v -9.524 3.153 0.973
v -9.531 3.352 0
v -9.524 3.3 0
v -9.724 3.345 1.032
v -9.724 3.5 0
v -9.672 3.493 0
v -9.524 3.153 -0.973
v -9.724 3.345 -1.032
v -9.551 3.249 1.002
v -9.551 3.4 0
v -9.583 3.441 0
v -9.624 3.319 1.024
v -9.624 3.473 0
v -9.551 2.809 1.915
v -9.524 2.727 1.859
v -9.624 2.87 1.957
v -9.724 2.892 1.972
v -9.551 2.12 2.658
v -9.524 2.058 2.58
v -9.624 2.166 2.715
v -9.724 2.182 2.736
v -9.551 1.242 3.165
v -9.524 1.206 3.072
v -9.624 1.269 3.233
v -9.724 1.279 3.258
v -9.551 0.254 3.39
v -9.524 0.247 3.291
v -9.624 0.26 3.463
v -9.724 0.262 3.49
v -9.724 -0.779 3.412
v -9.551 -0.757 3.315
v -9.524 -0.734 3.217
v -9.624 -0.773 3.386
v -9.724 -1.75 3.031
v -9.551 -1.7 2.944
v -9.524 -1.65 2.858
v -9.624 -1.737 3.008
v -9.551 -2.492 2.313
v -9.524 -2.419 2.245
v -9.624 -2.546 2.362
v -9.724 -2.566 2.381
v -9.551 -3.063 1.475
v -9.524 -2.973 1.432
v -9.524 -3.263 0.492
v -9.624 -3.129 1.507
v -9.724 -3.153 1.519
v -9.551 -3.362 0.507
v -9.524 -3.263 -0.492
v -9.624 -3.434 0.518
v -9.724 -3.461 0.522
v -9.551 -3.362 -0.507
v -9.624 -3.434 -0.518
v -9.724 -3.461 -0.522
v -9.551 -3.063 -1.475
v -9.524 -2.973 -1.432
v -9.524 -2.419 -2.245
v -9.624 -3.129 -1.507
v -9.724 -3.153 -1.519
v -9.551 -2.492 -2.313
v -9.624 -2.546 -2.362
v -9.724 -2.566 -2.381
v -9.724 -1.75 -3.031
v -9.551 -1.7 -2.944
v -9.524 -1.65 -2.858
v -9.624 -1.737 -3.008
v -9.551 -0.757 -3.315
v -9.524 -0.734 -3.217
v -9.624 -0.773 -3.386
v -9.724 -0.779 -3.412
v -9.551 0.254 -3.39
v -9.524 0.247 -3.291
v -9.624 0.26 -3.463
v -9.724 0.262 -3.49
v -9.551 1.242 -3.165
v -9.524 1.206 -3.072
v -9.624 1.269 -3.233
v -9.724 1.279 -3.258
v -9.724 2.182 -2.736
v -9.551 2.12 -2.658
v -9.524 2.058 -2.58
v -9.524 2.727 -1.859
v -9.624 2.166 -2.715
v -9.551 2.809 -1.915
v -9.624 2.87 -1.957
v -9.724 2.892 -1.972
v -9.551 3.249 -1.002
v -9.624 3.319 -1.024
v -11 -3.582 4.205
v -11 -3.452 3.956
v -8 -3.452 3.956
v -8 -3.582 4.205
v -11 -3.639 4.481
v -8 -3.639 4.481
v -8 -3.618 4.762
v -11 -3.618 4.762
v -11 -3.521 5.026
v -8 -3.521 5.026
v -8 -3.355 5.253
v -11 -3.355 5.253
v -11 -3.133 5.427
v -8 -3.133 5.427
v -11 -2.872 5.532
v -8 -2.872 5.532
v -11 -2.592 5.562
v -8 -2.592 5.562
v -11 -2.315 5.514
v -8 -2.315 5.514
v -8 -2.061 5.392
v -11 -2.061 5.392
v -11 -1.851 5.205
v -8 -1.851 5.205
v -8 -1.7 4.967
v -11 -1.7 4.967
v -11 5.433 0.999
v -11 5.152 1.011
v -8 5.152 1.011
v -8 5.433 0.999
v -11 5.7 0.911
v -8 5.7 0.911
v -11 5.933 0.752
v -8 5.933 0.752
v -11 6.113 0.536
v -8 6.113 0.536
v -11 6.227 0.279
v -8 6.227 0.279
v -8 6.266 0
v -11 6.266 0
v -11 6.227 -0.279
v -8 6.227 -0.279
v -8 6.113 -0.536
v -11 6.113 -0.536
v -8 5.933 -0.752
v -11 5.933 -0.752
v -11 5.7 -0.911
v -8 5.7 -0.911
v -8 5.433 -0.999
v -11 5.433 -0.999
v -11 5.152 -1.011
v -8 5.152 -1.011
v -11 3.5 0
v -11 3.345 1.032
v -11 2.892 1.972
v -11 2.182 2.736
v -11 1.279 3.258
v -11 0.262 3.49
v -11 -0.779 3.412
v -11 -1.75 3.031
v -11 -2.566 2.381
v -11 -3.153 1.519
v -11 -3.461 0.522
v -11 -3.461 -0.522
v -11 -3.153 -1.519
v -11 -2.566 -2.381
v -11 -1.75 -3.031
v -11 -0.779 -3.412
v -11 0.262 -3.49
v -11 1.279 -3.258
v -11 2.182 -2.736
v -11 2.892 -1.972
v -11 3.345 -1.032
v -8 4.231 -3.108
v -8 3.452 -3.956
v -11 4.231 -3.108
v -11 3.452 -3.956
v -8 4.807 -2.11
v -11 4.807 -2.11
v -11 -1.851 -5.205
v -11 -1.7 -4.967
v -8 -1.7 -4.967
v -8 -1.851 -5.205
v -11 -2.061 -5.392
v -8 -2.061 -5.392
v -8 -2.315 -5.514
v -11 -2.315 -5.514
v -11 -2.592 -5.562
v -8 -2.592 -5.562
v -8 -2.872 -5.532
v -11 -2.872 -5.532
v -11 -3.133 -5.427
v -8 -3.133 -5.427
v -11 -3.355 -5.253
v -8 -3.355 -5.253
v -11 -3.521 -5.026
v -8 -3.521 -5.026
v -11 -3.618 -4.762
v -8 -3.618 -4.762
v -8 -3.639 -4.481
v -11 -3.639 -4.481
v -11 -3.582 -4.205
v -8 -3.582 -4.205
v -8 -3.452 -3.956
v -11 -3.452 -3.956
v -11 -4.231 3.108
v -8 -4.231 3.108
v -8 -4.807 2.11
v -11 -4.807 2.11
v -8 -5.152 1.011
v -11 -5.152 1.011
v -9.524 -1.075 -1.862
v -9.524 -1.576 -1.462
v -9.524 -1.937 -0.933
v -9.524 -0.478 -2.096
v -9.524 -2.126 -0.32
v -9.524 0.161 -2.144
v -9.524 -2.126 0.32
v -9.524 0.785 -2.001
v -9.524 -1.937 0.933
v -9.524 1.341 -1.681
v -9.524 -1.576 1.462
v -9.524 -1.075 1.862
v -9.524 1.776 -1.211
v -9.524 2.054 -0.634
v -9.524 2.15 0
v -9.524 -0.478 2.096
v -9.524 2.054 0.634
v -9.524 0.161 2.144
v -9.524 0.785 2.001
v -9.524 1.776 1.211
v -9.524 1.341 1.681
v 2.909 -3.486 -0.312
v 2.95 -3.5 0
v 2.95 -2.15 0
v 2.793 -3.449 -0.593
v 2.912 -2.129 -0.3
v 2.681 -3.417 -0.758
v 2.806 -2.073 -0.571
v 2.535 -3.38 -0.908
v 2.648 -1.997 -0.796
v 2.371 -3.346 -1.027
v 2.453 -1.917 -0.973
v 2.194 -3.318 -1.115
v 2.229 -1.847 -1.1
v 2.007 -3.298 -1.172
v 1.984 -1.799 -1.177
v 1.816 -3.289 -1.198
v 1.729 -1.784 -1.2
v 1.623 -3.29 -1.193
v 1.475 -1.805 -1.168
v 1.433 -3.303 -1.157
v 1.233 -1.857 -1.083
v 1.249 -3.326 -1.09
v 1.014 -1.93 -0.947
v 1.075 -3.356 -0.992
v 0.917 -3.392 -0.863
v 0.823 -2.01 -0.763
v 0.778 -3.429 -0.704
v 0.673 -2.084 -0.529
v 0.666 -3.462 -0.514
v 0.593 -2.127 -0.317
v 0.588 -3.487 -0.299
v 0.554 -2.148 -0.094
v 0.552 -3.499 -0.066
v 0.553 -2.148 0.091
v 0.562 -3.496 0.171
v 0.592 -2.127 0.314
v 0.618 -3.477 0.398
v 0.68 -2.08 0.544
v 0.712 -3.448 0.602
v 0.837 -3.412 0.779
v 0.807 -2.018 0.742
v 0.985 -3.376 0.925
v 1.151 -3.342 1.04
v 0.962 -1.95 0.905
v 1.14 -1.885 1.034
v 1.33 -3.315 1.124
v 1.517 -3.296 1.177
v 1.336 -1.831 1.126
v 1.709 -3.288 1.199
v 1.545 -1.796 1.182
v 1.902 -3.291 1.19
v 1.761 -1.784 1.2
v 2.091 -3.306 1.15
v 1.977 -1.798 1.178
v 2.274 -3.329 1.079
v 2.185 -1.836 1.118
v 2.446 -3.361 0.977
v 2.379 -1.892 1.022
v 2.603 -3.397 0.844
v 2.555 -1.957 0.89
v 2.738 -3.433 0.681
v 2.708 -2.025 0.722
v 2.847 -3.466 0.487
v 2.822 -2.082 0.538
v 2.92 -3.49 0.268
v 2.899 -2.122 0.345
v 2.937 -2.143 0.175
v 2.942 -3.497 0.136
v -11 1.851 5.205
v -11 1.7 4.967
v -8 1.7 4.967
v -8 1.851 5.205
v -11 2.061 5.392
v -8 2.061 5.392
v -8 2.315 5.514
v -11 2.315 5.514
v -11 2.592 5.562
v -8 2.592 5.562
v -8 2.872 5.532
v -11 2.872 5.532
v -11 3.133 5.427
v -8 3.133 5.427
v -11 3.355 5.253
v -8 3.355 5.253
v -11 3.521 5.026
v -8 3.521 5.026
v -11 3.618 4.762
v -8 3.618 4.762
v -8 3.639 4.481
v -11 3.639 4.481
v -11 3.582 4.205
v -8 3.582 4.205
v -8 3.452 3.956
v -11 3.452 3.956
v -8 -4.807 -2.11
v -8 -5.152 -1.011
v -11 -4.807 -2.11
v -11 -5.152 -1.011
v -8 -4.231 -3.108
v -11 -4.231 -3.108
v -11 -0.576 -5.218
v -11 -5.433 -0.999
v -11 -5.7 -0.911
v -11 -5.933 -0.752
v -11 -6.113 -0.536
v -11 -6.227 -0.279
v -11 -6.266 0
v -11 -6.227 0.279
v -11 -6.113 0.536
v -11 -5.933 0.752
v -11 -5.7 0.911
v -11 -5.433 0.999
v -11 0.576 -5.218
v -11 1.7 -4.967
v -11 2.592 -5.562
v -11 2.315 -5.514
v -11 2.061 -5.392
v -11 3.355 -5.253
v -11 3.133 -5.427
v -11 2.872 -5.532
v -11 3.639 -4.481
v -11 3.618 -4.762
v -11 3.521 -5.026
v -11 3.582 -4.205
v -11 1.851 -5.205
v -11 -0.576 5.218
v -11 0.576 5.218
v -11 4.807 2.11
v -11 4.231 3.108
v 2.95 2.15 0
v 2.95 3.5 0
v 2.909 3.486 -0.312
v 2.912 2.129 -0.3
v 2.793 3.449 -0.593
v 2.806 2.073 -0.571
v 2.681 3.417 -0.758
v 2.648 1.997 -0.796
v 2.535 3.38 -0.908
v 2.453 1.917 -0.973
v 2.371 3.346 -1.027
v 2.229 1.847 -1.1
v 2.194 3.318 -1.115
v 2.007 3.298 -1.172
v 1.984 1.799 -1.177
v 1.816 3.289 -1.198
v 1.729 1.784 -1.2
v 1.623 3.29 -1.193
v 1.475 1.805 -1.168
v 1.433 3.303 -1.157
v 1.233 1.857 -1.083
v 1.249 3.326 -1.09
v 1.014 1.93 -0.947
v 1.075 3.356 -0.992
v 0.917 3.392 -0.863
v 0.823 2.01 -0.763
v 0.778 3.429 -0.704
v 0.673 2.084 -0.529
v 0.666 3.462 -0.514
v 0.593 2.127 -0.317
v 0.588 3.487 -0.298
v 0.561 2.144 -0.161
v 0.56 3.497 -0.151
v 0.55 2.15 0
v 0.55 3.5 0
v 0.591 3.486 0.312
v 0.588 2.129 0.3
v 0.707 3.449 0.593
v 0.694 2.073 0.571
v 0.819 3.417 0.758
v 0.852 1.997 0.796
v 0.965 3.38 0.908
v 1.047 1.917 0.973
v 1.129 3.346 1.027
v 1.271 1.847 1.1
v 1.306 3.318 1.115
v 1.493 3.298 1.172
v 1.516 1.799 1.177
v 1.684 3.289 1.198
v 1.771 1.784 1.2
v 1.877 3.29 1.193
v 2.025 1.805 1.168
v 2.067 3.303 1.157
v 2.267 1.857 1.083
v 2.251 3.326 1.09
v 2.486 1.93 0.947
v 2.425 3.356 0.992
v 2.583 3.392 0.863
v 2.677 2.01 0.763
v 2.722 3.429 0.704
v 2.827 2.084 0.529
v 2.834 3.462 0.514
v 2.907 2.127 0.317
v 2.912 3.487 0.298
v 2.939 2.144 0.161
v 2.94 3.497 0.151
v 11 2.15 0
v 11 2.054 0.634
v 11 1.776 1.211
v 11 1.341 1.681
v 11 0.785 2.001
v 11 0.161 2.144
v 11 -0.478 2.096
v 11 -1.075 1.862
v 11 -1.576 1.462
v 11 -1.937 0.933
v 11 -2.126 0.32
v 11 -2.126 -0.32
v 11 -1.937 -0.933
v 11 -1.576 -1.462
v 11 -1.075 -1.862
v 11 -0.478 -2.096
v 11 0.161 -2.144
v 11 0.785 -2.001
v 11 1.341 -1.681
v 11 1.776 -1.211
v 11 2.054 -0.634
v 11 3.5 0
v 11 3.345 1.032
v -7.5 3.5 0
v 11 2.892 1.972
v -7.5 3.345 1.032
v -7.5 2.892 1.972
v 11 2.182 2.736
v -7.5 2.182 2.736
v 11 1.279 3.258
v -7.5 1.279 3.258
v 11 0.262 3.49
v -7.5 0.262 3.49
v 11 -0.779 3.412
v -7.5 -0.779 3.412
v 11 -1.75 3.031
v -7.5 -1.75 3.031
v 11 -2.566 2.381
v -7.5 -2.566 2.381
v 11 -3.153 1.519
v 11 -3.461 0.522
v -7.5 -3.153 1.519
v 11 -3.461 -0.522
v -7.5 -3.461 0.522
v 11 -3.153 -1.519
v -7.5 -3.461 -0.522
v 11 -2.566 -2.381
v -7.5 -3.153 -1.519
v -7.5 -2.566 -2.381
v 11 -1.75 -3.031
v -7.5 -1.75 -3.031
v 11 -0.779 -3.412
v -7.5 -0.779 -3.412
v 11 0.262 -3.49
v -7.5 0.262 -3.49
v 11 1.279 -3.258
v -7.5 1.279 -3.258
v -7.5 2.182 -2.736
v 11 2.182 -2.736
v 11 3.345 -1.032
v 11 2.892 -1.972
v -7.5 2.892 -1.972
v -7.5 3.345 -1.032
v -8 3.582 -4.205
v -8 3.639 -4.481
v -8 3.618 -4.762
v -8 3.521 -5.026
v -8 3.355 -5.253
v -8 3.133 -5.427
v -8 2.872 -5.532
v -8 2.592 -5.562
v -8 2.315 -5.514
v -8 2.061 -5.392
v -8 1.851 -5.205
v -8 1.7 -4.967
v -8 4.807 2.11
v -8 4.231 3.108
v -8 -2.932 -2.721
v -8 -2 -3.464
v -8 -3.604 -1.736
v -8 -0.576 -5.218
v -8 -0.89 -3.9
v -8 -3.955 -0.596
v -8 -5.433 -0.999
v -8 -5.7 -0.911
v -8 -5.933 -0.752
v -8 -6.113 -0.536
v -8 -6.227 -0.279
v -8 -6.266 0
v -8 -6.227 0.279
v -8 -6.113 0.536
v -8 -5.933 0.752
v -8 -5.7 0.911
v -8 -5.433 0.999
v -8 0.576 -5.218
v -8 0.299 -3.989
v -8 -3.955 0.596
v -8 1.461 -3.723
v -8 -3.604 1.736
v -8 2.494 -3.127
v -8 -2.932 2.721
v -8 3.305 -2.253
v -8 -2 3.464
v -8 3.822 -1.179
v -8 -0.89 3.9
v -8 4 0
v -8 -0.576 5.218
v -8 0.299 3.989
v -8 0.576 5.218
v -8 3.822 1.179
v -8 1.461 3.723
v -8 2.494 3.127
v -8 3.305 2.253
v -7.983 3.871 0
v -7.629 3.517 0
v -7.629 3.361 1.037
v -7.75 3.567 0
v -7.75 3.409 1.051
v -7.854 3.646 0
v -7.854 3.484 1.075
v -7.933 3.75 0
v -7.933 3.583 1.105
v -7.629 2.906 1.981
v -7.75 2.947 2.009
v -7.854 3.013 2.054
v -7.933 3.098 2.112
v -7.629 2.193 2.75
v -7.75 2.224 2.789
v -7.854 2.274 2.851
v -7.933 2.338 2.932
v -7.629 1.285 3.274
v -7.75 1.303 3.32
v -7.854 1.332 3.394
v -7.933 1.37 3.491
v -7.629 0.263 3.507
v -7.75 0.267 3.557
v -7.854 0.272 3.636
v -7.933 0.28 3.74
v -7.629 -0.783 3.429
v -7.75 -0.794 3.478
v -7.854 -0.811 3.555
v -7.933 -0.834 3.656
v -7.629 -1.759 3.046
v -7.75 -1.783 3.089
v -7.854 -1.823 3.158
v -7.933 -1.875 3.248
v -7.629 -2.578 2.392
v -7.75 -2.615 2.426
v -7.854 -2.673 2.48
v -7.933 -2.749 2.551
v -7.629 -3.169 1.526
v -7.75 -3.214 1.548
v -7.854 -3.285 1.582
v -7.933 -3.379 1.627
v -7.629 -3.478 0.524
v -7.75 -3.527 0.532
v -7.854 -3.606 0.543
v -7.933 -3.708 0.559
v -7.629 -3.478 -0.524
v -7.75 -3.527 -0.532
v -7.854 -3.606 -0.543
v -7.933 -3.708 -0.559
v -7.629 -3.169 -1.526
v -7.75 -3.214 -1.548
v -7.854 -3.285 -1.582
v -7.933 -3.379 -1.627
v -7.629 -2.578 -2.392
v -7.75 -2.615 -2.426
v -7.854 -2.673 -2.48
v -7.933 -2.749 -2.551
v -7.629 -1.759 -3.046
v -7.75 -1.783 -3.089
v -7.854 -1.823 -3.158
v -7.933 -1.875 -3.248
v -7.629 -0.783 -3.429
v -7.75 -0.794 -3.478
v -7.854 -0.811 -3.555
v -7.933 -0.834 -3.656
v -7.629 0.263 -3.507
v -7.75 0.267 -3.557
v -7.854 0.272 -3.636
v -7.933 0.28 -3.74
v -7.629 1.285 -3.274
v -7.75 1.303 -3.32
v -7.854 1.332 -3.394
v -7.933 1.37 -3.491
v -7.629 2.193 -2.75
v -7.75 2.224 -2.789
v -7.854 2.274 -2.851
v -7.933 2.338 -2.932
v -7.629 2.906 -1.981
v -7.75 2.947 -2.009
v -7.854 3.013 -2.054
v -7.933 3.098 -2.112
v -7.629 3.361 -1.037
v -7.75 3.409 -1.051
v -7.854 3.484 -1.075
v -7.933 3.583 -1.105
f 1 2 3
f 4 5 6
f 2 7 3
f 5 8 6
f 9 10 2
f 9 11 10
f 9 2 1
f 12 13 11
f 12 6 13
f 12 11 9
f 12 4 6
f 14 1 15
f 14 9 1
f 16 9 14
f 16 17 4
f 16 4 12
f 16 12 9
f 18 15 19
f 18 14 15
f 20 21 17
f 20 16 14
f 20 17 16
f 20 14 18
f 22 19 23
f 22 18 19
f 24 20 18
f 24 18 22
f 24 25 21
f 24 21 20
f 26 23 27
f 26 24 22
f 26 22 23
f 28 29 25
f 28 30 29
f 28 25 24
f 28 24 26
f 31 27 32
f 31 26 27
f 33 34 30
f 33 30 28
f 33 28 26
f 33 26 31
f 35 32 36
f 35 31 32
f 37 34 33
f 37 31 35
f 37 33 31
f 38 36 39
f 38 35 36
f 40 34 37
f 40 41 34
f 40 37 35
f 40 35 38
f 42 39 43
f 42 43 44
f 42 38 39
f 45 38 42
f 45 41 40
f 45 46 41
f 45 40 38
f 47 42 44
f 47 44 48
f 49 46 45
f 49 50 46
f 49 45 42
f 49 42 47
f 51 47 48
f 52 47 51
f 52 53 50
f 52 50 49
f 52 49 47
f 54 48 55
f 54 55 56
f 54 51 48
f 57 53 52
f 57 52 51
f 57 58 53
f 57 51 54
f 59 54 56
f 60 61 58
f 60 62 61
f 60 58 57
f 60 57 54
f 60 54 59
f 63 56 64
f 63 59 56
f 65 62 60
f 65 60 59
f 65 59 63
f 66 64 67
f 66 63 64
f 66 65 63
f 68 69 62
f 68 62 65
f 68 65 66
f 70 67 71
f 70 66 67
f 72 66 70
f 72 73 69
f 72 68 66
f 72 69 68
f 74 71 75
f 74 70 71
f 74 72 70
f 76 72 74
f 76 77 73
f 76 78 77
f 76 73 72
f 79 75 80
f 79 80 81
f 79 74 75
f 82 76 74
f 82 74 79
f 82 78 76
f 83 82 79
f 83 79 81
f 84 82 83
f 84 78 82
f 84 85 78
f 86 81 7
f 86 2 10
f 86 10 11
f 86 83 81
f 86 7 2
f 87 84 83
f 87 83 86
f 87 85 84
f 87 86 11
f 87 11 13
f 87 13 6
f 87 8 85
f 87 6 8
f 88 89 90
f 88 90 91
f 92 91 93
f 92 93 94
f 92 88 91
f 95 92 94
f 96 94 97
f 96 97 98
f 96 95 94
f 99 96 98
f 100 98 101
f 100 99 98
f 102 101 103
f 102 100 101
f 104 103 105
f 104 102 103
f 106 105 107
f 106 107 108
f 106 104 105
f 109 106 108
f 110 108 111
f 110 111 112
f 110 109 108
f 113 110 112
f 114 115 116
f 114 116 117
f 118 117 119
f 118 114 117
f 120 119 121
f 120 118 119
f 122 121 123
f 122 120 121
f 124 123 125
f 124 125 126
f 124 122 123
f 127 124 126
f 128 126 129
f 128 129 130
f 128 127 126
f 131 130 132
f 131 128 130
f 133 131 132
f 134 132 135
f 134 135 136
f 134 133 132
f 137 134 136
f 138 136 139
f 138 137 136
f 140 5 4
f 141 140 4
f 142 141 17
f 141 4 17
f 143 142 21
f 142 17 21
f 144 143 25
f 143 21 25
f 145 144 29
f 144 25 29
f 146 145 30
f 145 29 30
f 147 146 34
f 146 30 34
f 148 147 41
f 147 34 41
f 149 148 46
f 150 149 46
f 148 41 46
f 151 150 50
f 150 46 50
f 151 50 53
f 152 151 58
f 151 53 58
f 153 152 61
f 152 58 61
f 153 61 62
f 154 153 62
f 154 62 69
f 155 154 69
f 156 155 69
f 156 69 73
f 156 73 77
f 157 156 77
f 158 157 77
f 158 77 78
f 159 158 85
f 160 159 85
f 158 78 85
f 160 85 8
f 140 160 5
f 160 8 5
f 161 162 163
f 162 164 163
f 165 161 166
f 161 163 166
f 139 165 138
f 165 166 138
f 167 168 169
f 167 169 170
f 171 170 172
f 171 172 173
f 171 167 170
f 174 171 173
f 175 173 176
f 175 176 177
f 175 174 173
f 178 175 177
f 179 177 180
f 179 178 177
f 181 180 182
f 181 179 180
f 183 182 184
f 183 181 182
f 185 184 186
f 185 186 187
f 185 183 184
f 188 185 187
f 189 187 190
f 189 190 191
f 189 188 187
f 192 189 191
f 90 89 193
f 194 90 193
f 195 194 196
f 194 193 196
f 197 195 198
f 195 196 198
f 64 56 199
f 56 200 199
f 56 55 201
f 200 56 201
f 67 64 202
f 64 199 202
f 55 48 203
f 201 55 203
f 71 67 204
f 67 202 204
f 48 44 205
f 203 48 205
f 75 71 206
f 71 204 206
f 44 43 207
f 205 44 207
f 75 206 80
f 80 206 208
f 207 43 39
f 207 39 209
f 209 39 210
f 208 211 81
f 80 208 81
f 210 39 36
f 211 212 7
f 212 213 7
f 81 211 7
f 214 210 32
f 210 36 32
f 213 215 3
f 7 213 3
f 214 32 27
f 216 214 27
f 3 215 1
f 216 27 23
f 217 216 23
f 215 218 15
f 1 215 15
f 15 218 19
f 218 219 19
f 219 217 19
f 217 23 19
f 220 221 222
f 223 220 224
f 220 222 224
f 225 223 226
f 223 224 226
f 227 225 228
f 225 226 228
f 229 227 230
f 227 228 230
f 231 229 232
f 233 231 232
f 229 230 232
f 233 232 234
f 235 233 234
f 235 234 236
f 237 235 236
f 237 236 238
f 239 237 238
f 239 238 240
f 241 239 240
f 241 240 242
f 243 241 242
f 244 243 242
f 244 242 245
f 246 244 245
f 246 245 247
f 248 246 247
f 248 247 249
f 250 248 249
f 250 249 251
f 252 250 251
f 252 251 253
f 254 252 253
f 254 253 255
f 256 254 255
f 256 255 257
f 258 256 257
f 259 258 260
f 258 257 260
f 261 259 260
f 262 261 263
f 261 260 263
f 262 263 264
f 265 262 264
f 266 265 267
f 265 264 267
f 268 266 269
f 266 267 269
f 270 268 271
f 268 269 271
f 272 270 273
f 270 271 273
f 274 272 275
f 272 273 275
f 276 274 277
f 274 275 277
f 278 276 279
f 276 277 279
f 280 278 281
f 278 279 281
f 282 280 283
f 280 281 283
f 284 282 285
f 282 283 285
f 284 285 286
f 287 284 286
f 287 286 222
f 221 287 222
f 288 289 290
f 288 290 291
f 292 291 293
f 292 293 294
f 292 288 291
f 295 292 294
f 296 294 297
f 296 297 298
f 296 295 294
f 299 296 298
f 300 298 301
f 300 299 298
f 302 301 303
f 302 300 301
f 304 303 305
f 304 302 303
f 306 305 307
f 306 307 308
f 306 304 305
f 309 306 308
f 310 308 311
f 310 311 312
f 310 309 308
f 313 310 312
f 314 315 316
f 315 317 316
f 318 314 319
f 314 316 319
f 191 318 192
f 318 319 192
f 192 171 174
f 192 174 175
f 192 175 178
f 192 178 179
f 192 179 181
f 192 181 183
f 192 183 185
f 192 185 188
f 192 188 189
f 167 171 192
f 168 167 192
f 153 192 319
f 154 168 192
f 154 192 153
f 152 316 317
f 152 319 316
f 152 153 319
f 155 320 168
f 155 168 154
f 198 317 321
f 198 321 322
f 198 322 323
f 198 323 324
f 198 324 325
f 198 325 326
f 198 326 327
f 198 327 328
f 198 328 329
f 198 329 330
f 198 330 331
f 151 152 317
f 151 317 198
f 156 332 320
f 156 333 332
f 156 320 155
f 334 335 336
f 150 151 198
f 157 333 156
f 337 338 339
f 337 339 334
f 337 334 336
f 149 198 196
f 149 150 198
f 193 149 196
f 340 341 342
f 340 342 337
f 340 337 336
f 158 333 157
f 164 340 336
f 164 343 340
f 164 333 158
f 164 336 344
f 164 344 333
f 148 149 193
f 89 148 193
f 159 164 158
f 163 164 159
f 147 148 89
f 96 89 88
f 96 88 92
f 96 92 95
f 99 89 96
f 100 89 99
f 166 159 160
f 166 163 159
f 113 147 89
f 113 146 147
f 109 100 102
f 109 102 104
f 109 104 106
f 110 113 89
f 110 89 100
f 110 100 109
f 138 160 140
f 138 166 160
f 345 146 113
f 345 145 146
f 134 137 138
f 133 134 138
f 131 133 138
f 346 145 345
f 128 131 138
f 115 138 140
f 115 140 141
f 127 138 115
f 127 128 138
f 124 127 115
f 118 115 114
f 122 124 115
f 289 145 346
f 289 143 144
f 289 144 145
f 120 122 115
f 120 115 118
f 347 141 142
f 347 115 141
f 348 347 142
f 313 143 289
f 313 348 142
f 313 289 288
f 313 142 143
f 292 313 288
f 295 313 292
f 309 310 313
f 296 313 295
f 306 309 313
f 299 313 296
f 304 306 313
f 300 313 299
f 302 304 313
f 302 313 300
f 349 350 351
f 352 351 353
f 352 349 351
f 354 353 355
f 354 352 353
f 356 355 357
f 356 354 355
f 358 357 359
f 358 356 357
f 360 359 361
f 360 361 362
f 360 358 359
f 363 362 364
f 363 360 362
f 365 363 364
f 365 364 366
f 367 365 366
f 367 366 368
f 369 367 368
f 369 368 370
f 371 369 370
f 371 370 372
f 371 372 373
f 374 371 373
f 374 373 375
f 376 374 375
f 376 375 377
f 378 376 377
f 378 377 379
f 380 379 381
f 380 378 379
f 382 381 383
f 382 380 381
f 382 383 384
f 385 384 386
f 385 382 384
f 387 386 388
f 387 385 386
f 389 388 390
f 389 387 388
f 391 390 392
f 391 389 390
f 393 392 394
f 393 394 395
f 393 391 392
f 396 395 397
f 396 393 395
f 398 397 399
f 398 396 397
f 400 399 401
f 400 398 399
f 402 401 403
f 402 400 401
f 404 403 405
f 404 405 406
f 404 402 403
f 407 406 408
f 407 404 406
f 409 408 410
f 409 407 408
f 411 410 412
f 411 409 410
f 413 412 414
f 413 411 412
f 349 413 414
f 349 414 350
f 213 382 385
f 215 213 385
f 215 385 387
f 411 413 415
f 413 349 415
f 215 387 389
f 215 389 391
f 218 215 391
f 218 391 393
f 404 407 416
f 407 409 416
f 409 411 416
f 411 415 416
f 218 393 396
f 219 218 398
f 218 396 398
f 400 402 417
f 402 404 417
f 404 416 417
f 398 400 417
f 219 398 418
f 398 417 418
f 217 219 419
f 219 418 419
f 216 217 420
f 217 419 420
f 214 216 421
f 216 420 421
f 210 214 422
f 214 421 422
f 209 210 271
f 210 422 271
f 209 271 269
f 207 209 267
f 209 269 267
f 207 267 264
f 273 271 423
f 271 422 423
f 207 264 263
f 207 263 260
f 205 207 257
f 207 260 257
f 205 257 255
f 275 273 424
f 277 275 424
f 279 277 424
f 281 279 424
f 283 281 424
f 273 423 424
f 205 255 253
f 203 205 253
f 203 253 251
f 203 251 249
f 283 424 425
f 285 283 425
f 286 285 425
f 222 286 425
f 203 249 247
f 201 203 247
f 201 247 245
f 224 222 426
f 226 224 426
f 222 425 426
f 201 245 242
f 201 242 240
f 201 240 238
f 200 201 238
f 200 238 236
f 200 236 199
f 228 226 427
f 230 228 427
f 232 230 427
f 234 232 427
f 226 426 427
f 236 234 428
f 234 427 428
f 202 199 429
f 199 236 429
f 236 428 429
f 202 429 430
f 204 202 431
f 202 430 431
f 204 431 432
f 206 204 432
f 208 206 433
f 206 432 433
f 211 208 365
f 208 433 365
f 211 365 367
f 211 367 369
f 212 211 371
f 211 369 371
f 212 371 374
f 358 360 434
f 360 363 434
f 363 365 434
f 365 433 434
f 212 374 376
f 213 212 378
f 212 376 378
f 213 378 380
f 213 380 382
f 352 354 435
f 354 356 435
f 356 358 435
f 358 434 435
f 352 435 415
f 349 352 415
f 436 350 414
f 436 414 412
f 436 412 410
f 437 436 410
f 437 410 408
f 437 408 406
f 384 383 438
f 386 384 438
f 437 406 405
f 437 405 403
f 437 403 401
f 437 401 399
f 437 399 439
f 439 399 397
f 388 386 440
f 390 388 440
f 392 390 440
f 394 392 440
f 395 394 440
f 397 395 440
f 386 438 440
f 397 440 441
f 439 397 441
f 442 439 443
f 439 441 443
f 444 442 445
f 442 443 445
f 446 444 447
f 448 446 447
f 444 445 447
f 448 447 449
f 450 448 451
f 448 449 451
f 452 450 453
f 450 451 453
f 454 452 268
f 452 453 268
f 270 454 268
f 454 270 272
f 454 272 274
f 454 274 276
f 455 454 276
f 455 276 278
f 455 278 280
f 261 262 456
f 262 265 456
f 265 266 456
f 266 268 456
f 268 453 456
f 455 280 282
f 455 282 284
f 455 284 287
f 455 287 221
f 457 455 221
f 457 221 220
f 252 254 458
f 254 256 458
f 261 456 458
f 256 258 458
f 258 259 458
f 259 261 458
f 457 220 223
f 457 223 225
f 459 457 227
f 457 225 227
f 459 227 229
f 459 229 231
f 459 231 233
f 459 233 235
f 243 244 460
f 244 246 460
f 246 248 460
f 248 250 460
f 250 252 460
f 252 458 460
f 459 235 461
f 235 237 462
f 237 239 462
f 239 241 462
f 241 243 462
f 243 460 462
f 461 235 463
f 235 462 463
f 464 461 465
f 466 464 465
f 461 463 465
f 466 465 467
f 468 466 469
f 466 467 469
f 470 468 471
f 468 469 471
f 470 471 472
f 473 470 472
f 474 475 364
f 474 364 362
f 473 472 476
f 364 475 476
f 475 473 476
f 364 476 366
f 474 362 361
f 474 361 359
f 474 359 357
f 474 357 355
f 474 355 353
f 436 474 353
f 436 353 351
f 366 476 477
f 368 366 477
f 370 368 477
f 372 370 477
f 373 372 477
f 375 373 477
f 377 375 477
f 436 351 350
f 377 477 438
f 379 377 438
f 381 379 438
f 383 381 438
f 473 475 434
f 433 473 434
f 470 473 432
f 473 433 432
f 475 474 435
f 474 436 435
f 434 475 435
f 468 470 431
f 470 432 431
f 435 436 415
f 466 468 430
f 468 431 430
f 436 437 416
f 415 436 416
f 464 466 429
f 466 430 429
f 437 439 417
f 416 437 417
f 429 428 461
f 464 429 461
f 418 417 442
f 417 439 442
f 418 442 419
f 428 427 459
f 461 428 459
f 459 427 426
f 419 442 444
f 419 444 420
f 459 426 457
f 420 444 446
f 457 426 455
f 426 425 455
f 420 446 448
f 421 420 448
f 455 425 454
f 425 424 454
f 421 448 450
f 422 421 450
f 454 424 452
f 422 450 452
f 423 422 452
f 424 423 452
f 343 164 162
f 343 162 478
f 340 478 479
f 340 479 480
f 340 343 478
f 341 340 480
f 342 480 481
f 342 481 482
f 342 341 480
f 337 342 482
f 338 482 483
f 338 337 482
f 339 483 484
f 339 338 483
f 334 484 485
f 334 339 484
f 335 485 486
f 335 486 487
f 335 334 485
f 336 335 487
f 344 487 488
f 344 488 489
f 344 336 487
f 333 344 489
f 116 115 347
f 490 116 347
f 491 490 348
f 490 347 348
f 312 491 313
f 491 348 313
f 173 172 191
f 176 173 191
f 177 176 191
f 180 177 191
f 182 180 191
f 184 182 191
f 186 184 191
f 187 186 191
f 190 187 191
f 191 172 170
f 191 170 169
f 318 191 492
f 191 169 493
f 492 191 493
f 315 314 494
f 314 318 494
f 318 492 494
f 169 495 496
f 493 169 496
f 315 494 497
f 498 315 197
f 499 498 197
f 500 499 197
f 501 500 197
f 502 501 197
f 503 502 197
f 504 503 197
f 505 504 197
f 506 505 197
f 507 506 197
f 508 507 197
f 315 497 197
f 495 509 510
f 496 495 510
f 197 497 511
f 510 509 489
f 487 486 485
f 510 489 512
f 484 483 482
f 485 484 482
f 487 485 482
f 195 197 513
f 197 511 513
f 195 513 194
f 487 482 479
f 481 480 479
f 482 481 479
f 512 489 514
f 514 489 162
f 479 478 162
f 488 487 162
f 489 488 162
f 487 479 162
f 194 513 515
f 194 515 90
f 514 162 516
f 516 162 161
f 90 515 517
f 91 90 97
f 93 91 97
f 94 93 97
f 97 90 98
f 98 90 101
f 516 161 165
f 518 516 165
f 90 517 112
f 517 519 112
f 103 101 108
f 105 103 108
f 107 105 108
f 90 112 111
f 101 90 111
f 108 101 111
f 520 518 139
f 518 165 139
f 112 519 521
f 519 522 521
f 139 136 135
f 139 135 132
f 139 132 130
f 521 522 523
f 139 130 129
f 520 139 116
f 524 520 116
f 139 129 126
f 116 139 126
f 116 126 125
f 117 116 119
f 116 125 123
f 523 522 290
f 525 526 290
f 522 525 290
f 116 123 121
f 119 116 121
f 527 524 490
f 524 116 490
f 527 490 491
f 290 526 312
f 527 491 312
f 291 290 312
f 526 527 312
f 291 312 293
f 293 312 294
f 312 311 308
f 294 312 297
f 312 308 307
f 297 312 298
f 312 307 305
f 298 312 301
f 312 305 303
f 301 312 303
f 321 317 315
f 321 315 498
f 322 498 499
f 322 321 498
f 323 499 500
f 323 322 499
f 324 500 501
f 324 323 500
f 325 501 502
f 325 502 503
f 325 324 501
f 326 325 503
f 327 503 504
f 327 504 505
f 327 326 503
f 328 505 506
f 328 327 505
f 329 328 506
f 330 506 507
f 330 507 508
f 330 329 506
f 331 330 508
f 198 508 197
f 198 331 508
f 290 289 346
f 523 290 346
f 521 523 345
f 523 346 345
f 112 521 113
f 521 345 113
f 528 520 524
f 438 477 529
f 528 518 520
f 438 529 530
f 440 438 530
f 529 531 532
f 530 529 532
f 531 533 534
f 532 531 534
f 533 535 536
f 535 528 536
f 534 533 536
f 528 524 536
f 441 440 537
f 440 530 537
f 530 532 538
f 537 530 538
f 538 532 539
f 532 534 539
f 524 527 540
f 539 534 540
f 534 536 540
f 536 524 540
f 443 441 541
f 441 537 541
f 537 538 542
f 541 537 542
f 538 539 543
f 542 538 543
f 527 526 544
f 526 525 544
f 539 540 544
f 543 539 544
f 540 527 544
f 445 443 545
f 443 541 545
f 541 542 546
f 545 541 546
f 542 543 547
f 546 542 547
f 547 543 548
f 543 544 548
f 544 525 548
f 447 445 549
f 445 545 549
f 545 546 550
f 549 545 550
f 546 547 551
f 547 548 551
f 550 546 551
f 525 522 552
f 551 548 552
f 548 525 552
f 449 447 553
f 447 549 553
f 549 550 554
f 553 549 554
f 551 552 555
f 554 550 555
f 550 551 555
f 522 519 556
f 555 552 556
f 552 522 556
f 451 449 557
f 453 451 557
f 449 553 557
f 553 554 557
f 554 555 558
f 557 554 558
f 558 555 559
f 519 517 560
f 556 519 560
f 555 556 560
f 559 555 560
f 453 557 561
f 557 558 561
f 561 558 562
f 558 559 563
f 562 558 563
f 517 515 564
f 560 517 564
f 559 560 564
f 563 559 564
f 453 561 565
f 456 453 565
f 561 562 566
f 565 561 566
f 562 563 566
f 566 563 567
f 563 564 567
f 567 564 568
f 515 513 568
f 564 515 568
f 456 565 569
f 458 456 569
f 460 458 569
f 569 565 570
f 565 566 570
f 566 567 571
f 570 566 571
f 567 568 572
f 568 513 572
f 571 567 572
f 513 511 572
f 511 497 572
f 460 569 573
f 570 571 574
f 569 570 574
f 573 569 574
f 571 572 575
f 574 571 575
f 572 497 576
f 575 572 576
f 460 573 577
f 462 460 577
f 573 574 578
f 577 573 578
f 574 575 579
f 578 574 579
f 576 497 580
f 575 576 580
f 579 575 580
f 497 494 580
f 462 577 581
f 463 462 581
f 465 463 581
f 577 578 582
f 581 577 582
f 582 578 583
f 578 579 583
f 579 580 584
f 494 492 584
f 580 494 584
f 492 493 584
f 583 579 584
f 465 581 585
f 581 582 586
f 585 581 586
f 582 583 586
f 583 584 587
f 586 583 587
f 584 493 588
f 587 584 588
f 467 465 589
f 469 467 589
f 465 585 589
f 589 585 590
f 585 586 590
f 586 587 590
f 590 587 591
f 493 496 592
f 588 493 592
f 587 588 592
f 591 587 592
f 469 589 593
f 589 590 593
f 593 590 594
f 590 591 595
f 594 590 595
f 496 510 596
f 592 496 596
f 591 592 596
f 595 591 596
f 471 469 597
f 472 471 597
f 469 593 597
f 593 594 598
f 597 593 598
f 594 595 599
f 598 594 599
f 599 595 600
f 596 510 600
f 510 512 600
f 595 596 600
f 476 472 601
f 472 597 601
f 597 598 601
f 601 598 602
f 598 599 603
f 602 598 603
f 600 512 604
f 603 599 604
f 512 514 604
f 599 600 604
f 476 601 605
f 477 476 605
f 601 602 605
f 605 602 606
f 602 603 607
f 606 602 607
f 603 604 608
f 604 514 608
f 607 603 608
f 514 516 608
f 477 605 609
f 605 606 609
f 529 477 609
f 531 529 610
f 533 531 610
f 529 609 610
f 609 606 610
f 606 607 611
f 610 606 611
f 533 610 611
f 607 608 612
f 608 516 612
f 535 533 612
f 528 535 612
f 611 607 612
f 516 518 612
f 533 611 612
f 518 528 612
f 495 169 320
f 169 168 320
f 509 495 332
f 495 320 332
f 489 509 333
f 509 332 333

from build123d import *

# Parameters (mm, degrees)
FILLET1_R               = 0.5
FILLET2_R               = 0.2
SKETCH2_R               = 1.2
CUT_EXTRUDE1_DEPTH      = 6.25
CUT_EXTRUDE1_DEPTH_BACK = 6.25
BOSS_EXTRUDE1_DEPTH     = 3


with BuildPart() as part:
    # Sketch1 → Revolve1 (revolve)
    with BuildSketch(Plane.XY):
        Polygon((11, 2.15), (11, 3.5), (-8, 3.5), (-8, 5.25), (-11, 5.25), (-11, 3.5), (-9.524, 3.5), (-9.524, 2.15), align=None)
    revolve(axis=Axis((-11, 0, 0), (1, 0, 0)))

    # Fillet1
    fillet1_edges = [part.edges().sort_by_distance(p)[0] for p in [
        (-8, -3.5, 0),
    ]]
    fillet(fillet1_edges, radius=FILLET1_R)

    # Fillet2
    fillet2_edges = [part.edges().sort_by_distance(p)[0] for p in [
        (-9.524, -3.5, 0),
    ]]
    fillet(fillet2_edges, radius=FILLET2_R)

    # Sketch2 → Cut-Extrude1 (cut, two sides)
    with BuildSketch(Plane(origin=(0, 0, 0), x_dir=(1, 0, 0), z_dir=(0, 1, 0))) as cut_extrude1_sk:
        with Locations((1.75, 0)):
            Circle(SKETCH2_R)
    extrude(amount=CUT_EXTRUDE1_DEPTH, mode=Mode.SUBTRACT)
    extrude(cut_extrude1_sk.sketch, amount=-CUT_EXTRUDE1_DEPTH_BACK, mode=Mode.SUBTRACT)

    # Sketch3 → Boss-Extrude1 (add)
    with BuildSketch(Plane.ZY.offset(11)):
        with BuildLine():
            ThreePointArc((1.011232478, 5.151689905), (0, 6.266), (-1.011232478, 5.151689905))
            ThreePointArc((-1.011232478, 5.151689905), (0, 5.25), (1.011232478, 5.151689905))
        make_face()
        with BuildLine():
            ThreePointArc((4.967110569, 1.700091937), (5.42651518, 3.133), (3.955878091, 3.451597968))
            ThreePointArc((3.955878091, 3.451597968), (4.54663337, 2.625), (4.967110569, 1.700091937))
        make_face()
        with BuildLine():
            ThreePointArc((3.955878091, -3.451597968), (5.42651518, -3.133), (4.967110569, -1.700091937))
            ThreePointArc((4.967110569, -1.700091937), (4.54663337, -2.625), (3.955878091, -3.451597968))
        make_face()
        with BuildLine():
            ThreePointArc((-1.011232478, -5.151689905), (0, -6.266), (1.011232478, -5.151689905))
            ThreePointArc((1.011232478, -5.151689905), (0, -5.25), (-1.011232478, -5.151689905))
        make_face()
        with BuildLine():
            ThreePointArc((-4.967110569, -1.700091937), (-5.42651518, -3.133), (-3.955878091, -3.451597968))
            ThreePointArc((-3.955878091, -3.451597968), (-4.54663337, -2.625), (-4.967110569, -1.700091937))
        make_face()
        with BuildLine():
            ThreePointArc((-3.955878091, 3.451597968), (-5.42651518, 3.133), (-4.967110569, 1.700091937))
            ThreePointArc((-4.967110569, 1.700091937), (-4.54663337, 2.625), (-3.955878091, 3.451597968))
        make_face()
    extrude(amount=-BOSS_EXTRUDE1_DEPTH)


solid = part.part
